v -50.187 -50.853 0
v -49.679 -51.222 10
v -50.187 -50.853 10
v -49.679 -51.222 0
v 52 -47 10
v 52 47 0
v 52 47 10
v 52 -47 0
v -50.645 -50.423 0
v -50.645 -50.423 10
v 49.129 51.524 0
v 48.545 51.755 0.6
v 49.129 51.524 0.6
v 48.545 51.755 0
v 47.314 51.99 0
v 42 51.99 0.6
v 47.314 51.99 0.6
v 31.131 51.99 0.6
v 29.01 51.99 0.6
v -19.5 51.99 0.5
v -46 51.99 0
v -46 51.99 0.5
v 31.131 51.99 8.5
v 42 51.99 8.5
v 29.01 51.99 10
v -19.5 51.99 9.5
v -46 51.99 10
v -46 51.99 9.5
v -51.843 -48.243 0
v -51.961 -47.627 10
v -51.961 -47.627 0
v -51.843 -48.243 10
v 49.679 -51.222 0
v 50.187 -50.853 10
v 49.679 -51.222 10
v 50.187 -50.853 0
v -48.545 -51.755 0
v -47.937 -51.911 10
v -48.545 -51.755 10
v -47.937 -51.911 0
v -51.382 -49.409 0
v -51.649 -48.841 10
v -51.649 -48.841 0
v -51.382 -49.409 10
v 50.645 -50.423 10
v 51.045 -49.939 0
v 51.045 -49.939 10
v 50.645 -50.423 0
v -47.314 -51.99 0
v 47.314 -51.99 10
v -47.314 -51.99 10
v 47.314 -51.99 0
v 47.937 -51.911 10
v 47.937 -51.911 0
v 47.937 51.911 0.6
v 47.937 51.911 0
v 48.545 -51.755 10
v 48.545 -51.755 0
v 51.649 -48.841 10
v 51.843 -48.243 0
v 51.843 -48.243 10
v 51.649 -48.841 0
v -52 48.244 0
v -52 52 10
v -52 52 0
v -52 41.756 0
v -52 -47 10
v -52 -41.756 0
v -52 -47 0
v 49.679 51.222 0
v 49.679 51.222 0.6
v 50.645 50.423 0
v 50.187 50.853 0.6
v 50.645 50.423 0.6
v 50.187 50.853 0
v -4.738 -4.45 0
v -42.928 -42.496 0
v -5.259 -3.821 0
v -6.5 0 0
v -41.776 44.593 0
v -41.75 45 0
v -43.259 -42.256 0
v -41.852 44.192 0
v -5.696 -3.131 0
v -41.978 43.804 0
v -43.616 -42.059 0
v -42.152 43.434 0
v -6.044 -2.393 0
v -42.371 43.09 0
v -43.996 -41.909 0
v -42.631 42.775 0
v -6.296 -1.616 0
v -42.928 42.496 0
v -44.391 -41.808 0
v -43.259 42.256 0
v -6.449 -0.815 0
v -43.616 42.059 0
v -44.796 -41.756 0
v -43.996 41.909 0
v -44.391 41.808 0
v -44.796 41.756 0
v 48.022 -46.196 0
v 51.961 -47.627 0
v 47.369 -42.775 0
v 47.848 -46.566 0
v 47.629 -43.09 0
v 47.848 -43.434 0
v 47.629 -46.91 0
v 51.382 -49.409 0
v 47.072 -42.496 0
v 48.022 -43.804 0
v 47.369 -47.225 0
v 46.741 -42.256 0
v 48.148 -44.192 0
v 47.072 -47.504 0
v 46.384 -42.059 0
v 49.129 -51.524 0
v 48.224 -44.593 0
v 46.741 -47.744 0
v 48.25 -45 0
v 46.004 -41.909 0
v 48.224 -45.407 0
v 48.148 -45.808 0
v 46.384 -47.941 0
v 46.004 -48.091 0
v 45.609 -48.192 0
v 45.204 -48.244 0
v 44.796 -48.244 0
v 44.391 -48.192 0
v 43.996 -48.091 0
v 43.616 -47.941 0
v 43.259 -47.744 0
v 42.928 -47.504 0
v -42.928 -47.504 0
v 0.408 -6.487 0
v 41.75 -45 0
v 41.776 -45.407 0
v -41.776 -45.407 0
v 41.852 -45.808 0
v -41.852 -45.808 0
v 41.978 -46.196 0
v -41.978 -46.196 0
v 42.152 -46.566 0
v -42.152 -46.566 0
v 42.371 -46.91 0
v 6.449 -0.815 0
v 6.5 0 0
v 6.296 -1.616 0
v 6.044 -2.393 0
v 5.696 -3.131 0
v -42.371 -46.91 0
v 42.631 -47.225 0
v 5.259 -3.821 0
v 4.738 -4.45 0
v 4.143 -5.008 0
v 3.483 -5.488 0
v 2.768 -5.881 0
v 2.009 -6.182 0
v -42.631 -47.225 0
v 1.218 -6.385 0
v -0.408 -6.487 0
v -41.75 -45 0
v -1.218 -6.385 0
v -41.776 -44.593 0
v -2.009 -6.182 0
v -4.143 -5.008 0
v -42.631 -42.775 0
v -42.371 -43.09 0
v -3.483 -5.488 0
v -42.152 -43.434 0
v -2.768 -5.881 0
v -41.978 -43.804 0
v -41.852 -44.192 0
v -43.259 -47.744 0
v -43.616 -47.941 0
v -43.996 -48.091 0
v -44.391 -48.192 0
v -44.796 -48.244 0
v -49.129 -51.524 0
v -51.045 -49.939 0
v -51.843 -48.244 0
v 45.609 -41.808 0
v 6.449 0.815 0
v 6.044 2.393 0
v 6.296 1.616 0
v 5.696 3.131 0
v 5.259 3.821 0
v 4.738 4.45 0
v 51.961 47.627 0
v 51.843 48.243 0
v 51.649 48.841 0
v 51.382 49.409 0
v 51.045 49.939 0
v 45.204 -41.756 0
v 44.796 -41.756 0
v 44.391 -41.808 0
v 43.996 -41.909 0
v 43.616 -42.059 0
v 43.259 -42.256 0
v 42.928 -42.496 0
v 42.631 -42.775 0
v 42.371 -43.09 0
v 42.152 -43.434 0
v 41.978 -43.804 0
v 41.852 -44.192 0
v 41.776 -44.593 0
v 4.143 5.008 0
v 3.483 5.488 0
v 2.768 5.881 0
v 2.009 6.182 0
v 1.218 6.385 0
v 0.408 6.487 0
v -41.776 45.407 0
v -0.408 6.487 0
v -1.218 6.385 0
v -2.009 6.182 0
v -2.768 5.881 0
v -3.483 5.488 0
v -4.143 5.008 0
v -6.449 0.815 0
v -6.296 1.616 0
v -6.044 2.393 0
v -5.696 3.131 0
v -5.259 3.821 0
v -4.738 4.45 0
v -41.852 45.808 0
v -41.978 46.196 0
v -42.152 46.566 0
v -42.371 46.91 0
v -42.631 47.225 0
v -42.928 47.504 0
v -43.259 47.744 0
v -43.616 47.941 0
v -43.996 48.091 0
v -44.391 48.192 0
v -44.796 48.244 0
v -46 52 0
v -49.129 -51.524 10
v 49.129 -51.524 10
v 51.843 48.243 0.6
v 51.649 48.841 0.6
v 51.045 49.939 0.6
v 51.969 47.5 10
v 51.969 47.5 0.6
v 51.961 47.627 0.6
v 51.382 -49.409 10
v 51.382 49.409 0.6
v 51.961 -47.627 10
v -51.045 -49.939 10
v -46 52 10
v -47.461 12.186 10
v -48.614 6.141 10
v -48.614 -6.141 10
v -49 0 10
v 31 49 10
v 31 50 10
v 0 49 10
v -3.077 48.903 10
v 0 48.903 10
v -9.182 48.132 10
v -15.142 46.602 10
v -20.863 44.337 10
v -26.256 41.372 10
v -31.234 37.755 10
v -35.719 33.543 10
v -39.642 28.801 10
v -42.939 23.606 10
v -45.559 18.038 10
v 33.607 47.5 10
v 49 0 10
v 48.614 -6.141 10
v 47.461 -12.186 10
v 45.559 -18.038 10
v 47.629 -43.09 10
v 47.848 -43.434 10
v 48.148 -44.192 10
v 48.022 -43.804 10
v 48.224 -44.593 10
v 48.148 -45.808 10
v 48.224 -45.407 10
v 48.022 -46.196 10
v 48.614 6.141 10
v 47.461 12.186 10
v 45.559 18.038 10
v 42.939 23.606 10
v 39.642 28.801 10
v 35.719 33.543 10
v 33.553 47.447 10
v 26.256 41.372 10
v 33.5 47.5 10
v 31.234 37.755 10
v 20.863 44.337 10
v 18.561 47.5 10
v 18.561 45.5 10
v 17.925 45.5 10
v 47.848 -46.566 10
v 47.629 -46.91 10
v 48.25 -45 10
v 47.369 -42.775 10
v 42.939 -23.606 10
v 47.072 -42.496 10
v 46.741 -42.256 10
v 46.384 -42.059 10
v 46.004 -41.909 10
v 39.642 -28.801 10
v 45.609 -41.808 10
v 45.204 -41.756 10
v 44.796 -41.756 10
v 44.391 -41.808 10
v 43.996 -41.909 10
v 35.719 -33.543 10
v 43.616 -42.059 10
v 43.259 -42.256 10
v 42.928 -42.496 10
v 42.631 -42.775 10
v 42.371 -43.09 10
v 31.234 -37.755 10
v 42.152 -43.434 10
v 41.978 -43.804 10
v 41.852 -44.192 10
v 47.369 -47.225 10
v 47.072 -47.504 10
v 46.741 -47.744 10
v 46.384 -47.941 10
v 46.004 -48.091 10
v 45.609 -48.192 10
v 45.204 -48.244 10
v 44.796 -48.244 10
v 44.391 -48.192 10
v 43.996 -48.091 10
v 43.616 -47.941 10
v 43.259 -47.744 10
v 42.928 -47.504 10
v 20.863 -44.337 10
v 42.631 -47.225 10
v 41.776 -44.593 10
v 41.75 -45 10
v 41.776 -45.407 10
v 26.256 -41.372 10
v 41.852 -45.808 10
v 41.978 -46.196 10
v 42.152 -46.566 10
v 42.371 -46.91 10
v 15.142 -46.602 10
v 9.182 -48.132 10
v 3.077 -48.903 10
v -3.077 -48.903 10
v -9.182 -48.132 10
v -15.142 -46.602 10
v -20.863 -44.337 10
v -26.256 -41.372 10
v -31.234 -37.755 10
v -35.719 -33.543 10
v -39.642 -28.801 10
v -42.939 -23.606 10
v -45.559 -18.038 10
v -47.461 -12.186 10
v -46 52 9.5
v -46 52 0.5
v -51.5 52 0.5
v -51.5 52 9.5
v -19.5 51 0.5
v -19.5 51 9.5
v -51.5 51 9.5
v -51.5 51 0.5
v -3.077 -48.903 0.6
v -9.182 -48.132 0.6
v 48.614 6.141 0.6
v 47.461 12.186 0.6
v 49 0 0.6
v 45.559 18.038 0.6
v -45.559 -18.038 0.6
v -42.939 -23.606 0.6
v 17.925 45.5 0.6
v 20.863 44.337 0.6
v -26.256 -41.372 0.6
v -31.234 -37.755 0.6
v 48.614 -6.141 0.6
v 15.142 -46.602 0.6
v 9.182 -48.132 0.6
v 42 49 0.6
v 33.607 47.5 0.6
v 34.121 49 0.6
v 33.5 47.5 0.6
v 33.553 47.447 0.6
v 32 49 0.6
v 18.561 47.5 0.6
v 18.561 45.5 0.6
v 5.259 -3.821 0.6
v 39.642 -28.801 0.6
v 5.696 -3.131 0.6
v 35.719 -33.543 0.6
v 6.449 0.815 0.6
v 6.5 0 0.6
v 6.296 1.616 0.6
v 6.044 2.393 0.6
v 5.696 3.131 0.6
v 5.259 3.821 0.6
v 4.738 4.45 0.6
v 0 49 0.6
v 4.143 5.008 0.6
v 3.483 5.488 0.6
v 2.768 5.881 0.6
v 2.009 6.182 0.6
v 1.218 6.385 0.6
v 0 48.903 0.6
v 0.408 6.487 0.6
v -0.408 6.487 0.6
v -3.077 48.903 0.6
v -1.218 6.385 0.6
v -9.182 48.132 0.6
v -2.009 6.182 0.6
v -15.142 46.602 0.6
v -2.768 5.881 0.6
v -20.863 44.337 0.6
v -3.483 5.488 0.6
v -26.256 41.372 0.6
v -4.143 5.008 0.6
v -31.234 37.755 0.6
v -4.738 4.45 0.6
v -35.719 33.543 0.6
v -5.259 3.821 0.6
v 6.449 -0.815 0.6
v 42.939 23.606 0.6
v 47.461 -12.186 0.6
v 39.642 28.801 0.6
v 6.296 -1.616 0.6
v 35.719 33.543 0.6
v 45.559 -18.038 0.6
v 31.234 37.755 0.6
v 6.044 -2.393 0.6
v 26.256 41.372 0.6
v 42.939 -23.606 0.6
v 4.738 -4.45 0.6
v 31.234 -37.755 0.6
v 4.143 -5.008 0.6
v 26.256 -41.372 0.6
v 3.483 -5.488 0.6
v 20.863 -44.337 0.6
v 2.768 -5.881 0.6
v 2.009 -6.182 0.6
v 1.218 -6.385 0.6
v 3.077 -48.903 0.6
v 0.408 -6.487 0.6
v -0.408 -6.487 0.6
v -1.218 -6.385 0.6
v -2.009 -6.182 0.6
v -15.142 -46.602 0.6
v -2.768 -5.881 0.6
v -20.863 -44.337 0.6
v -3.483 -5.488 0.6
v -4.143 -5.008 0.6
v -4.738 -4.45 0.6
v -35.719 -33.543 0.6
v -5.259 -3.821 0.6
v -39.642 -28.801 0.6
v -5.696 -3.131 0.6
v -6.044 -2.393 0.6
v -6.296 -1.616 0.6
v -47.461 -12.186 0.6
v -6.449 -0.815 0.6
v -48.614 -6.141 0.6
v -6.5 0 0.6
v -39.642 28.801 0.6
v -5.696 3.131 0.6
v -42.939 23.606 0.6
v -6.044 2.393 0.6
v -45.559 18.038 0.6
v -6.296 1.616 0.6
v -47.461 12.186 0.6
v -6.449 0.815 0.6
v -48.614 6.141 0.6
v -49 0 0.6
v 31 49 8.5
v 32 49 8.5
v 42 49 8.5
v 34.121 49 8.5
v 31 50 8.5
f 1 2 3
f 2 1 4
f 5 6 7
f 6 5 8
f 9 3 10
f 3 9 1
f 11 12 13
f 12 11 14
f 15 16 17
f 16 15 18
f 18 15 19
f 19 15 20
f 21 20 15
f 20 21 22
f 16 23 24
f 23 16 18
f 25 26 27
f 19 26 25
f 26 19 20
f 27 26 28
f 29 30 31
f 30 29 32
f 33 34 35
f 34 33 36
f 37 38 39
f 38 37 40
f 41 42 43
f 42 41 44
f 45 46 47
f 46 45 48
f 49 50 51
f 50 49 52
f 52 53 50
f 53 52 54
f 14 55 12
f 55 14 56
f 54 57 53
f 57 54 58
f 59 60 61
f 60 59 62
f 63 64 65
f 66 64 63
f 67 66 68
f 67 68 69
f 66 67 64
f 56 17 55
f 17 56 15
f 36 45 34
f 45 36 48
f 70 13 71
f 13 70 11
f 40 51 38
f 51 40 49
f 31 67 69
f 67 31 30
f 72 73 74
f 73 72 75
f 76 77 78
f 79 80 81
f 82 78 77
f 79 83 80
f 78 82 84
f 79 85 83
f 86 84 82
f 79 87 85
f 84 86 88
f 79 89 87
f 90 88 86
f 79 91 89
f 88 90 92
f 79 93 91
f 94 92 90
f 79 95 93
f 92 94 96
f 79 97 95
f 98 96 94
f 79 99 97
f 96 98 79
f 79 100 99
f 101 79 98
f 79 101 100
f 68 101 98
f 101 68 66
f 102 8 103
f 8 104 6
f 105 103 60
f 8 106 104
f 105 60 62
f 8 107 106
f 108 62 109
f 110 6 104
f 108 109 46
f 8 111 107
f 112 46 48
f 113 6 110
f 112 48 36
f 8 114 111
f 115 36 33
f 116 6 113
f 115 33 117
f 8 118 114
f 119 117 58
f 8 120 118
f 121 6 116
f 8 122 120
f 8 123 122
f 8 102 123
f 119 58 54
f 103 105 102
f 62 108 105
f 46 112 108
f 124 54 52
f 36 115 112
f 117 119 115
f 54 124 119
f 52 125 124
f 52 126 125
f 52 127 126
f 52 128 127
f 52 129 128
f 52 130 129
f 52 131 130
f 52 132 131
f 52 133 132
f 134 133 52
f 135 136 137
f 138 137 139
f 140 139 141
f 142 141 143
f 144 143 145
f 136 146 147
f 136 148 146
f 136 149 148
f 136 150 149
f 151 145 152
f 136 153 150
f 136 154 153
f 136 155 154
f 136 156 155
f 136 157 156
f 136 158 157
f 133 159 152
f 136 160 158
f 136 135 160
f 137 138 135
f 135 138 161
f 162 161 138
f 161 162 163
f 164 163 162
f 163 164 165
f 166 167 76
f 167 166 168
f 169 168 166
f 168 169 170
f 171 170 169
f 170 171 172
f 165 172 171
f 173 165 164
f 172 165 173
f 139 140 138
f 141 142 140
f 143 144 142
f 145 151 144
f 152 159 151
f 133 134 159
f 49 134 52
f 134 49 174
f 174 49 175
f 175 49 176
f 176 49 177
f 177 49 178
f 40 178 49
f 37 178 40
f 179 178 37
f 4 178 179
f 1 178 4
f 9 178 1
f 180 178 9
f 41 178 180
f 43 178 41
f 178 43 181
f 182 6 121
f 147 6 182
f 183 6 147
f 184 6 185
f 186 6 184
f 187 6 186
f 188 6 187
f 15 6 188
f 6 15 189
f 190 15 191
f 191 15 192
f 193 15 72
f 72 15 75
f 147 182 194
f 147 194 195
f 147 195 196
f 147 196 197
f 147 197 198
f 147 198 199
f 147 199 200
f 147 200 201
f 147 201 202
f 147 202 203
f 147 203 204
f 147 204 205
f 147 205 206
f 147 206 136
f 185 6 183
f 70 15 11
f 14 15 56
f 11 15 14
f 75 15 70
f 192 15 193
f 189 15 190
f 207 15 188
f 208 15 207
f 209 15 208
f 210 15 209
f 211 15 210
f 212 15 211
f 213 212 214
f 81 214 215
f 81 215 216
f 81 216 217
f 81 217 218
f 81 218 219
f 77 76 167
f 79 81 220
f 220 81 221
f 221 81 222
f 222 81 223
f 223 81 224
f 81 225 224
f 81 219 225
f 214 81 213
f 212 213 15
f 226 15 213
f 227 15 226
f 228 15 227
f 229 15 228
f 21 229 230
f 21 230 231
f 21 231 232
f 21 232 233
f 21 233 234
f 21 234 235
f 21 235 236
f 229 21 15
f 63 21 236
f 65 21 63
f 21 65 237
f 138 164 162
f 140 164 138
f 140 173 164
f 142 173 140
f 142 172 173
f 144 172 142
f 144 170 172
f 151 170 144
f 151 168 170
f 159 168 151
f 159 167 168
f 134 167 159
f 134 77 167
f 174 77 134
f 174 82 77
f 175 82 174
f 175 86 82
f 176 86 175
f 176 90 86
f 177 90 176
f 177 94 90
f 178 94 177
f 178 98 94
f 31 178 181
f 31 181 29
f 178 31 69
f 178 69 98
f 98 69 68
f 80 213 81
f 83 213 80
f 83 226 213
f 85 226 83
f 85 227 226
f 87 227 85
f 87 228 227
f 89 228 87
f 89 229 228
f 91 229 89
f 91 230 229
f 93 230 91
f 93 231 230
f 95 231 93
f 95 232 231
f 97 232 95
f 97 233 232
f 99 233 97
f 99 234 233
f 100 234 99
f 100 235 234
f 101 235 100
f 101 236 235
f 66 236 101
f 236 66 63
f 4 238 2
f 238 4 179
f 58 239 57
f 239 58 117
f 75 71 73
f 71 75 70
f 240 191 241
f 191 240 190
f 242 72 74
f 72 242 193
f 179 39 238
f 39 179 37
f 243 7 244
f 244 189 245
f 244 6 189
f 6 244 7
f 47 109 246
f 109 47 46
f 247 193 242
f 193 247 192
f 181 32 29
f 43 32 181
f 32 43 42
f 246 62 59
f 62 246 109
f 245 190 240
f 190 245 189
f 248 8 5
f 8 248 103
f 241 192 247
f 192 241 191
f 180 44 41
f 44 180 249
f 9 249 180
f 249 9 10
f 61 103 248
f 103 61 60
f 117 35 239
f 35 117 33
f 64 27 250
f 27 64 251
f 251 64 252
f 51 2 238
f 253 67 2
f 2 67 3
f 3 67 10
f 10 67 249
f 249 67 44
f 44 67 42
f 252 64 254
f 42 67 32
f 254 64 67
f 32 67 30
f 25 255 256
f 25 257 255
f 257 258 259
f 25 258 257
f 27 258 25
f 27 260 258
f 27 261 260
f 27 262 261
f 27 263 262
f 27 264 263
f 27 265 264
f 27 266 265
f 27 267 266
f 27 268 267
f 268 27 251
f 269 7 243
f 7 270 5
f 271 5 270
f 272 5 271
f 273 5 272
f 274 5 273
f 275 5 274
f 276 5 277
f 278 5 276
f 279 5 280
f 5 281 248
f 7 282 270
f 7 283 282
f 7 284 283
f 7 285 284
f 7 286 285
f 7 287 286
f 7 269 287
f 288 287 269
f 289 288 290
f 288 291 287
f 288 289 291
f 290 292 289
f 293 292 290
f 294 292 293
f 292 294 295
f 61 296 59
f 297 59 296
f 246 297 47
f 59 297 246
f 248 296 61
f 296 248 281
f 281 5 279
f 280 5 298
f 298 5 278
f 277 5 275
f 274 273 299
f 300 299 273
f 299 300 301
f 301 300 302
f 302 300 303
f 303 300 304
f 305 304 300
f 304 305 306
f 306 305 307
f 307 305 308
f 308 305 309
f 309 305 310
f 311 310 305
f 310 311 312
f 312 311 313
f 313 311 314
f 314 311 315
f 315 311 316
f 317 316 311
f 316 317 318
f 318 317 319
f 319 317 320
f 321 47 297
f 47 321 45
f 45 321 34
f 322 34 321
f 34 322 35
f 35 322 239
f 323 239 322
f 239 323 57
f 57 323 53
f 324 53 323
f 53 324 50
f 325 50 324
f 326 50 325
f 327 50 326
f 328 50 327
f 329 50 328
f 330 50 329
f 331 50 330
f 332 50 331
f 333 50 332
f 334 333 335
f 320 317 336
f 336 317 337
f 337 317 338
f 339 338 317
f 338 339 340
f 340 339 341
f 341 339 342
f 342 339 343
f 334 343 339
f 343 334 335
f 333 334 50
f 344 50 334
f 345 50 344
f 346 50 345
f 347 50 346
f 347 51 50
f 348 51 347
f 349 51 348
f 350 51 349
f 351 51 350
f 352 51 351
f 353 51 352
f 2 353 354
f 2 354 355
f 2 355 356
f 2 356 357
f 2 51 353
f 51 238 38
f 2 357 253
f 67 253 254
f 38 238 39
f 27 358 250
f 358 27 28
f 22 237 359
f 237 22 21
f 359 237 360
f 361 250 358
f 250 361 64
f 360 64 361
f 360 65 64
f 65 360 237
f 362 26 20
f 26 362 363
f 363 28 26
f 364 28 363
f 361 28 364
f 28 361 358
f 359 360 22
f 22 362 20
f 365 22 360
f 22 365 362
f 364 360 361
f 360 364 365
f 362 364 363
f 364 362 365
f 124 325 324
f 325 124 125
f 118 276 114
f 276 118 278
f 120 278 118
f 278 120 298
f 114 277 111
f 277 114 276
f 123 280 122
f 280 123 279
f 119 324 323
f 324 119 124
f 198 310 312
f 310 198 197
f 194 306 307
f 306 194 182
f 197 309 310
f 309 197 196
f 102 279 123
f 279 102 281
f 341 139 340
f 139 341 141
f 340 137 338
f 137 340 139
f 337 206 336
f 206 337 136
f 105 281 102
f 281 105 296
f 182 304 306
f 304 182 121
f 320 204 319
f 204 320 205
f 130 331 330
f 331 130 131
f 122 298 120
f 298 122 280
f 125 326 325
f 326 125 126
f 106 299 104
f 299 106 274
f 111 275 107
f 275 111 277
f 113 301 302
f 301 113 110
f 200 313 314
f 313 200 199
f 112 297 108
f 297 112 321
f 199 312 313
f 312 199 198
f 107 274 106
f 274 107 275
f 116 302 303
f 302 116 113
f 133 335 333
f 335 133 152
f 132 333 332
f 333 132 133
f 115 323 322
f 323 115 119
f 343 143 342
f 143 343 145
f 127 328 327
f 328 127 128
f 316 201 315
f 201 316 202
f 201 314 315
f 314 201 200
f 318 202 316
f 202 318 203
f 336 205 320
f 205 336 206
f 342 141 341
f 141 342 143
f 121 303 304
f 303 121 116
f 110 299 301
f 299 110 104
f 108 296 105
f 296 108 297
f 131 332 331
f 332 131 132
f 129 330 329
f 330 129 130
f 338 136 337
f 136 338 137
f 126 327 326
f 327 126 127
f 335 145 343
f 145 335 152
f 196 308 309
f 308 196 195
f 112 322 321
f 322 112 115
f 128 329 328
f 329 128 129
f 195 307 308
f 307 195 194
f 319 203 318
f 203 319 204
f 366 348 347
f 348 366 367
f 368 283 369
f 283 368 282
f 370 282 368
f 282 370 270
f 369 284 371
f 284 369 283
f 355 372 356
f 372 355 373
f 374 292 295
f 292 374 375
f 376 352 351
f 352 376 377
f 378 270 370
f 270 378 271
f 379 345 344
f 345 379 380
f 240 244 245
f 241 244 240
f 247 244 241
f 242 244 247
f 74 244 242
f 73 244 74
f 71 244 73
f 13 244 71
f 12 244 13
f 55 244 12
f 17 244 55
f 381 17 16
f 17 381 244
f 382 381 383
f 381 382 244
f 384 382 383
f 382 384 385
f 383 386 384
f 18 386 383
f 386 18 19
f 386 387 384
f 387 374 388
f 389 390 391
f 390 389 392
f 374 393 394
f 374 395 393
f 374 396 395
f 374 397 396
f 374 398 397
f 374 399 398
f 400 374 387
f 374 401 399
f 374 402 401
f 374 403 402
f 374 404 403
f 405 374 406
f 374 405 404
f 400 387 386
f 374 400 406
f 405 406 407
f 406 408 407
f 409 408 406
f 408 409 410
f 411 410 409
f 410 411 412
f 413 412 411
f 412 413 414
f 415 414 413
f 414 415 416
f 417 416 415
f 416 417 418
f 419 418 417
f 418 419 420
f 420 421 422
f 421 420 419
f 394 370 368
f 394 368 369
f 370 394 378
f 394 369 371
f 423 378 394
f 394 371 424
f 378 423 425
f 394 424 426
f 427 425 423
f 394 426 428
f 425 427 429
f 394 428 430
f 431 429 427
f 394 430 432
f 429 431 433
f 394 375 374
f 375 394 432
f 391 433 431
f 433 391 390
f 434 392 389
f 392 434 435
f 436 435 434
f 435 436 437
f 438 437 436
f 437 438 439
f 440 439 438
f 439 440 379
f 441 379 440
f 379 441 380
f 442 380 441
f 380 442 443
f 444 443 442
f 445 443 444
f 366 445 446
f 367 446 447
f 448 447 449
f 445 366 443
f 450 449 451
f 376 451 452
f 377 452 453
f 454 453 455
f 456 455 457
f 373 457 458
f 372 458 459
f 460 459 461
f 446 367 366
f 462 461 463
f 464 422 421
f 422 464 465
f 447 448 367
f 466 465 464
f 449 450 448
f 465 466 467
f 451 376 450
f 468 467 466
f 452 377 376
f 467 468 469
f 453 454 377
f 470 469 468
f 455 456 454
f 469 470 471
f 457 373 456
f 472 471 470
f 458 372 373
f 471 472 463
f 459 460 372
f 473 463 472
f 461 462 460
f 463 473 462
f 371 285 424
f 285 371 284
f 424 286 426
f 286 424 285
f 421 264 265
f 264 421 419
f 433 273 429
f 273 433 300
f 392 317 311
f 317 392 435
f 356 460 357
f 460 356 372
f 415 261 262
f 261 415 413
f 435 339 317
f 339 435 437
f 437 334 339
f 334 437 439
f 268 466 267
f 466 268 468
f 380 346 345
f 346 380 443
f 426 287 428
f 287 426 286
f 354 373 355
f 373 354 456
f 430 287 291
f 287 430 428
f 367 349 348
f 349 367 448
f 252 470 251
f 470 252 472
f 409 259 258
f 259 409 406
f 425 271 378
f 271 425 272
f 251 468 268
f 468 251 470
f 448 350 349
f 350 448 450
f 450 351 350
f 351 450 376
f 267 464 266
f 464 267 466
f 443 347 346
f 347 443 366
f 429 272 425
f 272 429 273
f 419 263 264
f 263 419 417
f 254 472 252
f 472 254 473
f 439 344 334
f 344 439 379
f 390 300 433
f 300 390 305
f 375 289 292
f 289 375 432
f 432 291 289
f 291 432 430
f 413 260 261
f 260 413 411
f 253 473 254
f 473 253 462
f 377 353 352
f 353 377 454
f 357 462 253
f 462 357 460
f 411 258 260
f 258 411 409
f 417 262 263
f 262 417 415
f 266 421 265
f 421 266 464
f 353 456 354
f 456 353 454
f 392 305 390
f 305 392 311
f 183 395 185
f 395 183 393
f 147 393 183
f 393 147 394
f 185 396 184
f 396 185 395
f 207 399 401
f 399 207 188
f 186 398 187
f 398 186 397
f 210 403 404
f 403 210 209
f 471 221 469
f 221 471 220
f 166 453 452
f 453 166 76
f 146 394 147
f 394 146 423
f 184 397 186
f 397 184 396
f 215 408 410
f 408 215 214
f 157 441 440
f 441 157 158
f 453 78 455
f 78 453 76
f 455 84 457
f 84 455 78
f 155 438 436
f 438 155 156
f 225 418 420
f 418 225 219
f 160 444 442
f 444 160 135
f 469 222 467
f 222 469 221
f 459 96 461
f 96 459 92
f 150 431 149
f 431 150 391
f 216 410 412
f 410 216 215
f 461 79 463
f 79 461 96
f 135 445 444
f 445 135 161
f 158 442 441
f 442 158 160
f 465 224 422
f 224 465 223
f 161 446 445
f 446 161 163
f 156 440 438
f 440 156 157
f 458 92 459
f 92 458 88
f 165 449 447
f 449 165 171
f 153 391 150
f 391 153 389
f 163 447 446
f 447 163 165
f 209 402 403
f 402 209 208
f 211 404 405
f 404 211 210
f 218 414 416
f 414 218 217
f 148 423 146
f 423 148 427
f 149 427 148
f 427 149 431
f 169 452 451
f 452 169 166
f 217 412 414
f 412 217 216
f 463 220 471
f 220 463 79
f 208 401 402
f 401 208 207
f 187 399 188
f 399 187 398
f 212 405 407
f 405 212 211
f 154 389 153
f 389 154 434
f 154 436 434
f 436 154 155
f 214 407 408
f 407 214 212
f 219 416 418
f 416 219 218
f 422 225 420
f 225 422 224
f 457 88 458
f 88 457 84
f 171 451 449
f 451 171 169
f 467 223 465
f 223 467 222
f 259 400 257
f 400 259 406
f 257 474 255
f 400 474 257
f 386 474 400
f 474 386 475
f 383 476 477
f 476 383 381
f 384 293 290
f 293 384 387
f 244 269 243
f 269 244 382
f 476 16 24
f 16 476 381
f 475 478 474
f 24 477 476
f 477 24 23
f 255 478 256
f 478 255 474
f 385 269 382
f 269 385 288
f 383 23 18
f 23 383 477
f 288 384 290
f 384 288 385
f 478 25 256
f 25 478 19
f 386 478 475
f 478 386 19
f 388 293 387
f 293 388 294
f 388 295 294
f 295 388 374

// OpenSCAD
$fn = 50;


difference() {
	union() {
		hull() {
			translate(v = [-47.0000000000, 47.0000000000, 0]) {
				cylinder(h = 10, r = 5);
			}
			translate(v = [47.0000000000, 47.0000000000, 0]) {
				cylinder(h = 10, r = 5);
			}
			translate(v = [-47.0000000000, -47.0000000000, 0]) {
				cylinder(h = 10, r = 5);
			}
			translate(v = [47.0000000000, -47.0000000000, 0]) {
				cylinder(h = 10, r = 5);
			}
		}
		translate(v = [-52.0000000000, 46.0000000000, 0]) {
			cube(size = [6, 6, 10]);
		}
	}
	union() {
		translate(v = [-52.5000000000, -45.0000000000, -250.0000000000]) {
			rotate(a = [0, 0, 0]) {
				difference() {
					union() {
						hull() {
							translate(v = [7.5000000000, 0, 0]) {
								cylinder(h = 250, r = 3.2500000000, r1 = 3.2500000000, r2 = 3.2500000000);
							}
							translate(v = [-7.5000000000, 0, 0]) {
								cylinder(h = 250, r = 3.2500000000, r1 = 3.2500000000, r2 = 3.2500000000);
							}
						}
					}
					union();
				}
			}
		}
		translate(v = [-52.5000000000, 45.0000000000, -250.0000000000]) {
			rotate(a = [0, 0, 0]) {
				difference() {
					union() {
						hull() {
							translate(v = [7.5000000000, 0, 0]) {
								cylinder(h = 250, r = 3.2500000000, r1 = 3.2500000000, r2 = 3.2500000000);
							}
							translate(v = [-7.5000000000, 0, 0]) {
								cylinder(h = 250, r = 3.2500000000, r1 = 3.2500000000, r2 = 3.2500000000);
							}
						}
					}
					union();
				}
			}
		}
		translate(v = [-51.5000000000, 51.0000000000, 0.5000000000]) {
			cube(size = [32, 1, 9.0000000000]);
		}
		translate(v = [45.0000000000, -45.0000000000, -50.0000000000]) {
			cylinder(h = 100, r = 3.2500000000);
		}
		translate(v = [0, 0, 0.6000000000]) {
			cylinder(h = 12.4000000000, r = 49.0000000000);
		}
		translate(v = [0, 0, -5.0000000000]) {
			cylinder(h = 10, r = 6.5000000000);
		}
		translate(v = [0.0000000000, 47.5000000000, 0.6000000000]) {
			cube(size = [52.0000000000, 1.5000000000, 12.4000000000]);
		}
		translate(v = [42.0000000000, 47.5000000000, 0.6000000000]) {
			cube(size = [10, 4.5000000000, 12.4000000000]);
		}
		translate(v = [31.0000000000, 47.5000000000, 8.5000000000]) {
			cube(size = [21, 4.5000000000, 1.5000000000]);
		}
		translate(v = [28.2500000000, 52.7500000000, 0.6000000000]) {
			rotate(a = [0, 0, -45]) {
				cube(size = [7.5000000000, 1.5000000000, 12.4000000000]);
			}
		}
		translate(v = [11.0610000000, 45.5000000000, 0.6000000000]) {
			cube(size = [7.5000000000, 2, 9.4000000000]);
		}
	}
}
